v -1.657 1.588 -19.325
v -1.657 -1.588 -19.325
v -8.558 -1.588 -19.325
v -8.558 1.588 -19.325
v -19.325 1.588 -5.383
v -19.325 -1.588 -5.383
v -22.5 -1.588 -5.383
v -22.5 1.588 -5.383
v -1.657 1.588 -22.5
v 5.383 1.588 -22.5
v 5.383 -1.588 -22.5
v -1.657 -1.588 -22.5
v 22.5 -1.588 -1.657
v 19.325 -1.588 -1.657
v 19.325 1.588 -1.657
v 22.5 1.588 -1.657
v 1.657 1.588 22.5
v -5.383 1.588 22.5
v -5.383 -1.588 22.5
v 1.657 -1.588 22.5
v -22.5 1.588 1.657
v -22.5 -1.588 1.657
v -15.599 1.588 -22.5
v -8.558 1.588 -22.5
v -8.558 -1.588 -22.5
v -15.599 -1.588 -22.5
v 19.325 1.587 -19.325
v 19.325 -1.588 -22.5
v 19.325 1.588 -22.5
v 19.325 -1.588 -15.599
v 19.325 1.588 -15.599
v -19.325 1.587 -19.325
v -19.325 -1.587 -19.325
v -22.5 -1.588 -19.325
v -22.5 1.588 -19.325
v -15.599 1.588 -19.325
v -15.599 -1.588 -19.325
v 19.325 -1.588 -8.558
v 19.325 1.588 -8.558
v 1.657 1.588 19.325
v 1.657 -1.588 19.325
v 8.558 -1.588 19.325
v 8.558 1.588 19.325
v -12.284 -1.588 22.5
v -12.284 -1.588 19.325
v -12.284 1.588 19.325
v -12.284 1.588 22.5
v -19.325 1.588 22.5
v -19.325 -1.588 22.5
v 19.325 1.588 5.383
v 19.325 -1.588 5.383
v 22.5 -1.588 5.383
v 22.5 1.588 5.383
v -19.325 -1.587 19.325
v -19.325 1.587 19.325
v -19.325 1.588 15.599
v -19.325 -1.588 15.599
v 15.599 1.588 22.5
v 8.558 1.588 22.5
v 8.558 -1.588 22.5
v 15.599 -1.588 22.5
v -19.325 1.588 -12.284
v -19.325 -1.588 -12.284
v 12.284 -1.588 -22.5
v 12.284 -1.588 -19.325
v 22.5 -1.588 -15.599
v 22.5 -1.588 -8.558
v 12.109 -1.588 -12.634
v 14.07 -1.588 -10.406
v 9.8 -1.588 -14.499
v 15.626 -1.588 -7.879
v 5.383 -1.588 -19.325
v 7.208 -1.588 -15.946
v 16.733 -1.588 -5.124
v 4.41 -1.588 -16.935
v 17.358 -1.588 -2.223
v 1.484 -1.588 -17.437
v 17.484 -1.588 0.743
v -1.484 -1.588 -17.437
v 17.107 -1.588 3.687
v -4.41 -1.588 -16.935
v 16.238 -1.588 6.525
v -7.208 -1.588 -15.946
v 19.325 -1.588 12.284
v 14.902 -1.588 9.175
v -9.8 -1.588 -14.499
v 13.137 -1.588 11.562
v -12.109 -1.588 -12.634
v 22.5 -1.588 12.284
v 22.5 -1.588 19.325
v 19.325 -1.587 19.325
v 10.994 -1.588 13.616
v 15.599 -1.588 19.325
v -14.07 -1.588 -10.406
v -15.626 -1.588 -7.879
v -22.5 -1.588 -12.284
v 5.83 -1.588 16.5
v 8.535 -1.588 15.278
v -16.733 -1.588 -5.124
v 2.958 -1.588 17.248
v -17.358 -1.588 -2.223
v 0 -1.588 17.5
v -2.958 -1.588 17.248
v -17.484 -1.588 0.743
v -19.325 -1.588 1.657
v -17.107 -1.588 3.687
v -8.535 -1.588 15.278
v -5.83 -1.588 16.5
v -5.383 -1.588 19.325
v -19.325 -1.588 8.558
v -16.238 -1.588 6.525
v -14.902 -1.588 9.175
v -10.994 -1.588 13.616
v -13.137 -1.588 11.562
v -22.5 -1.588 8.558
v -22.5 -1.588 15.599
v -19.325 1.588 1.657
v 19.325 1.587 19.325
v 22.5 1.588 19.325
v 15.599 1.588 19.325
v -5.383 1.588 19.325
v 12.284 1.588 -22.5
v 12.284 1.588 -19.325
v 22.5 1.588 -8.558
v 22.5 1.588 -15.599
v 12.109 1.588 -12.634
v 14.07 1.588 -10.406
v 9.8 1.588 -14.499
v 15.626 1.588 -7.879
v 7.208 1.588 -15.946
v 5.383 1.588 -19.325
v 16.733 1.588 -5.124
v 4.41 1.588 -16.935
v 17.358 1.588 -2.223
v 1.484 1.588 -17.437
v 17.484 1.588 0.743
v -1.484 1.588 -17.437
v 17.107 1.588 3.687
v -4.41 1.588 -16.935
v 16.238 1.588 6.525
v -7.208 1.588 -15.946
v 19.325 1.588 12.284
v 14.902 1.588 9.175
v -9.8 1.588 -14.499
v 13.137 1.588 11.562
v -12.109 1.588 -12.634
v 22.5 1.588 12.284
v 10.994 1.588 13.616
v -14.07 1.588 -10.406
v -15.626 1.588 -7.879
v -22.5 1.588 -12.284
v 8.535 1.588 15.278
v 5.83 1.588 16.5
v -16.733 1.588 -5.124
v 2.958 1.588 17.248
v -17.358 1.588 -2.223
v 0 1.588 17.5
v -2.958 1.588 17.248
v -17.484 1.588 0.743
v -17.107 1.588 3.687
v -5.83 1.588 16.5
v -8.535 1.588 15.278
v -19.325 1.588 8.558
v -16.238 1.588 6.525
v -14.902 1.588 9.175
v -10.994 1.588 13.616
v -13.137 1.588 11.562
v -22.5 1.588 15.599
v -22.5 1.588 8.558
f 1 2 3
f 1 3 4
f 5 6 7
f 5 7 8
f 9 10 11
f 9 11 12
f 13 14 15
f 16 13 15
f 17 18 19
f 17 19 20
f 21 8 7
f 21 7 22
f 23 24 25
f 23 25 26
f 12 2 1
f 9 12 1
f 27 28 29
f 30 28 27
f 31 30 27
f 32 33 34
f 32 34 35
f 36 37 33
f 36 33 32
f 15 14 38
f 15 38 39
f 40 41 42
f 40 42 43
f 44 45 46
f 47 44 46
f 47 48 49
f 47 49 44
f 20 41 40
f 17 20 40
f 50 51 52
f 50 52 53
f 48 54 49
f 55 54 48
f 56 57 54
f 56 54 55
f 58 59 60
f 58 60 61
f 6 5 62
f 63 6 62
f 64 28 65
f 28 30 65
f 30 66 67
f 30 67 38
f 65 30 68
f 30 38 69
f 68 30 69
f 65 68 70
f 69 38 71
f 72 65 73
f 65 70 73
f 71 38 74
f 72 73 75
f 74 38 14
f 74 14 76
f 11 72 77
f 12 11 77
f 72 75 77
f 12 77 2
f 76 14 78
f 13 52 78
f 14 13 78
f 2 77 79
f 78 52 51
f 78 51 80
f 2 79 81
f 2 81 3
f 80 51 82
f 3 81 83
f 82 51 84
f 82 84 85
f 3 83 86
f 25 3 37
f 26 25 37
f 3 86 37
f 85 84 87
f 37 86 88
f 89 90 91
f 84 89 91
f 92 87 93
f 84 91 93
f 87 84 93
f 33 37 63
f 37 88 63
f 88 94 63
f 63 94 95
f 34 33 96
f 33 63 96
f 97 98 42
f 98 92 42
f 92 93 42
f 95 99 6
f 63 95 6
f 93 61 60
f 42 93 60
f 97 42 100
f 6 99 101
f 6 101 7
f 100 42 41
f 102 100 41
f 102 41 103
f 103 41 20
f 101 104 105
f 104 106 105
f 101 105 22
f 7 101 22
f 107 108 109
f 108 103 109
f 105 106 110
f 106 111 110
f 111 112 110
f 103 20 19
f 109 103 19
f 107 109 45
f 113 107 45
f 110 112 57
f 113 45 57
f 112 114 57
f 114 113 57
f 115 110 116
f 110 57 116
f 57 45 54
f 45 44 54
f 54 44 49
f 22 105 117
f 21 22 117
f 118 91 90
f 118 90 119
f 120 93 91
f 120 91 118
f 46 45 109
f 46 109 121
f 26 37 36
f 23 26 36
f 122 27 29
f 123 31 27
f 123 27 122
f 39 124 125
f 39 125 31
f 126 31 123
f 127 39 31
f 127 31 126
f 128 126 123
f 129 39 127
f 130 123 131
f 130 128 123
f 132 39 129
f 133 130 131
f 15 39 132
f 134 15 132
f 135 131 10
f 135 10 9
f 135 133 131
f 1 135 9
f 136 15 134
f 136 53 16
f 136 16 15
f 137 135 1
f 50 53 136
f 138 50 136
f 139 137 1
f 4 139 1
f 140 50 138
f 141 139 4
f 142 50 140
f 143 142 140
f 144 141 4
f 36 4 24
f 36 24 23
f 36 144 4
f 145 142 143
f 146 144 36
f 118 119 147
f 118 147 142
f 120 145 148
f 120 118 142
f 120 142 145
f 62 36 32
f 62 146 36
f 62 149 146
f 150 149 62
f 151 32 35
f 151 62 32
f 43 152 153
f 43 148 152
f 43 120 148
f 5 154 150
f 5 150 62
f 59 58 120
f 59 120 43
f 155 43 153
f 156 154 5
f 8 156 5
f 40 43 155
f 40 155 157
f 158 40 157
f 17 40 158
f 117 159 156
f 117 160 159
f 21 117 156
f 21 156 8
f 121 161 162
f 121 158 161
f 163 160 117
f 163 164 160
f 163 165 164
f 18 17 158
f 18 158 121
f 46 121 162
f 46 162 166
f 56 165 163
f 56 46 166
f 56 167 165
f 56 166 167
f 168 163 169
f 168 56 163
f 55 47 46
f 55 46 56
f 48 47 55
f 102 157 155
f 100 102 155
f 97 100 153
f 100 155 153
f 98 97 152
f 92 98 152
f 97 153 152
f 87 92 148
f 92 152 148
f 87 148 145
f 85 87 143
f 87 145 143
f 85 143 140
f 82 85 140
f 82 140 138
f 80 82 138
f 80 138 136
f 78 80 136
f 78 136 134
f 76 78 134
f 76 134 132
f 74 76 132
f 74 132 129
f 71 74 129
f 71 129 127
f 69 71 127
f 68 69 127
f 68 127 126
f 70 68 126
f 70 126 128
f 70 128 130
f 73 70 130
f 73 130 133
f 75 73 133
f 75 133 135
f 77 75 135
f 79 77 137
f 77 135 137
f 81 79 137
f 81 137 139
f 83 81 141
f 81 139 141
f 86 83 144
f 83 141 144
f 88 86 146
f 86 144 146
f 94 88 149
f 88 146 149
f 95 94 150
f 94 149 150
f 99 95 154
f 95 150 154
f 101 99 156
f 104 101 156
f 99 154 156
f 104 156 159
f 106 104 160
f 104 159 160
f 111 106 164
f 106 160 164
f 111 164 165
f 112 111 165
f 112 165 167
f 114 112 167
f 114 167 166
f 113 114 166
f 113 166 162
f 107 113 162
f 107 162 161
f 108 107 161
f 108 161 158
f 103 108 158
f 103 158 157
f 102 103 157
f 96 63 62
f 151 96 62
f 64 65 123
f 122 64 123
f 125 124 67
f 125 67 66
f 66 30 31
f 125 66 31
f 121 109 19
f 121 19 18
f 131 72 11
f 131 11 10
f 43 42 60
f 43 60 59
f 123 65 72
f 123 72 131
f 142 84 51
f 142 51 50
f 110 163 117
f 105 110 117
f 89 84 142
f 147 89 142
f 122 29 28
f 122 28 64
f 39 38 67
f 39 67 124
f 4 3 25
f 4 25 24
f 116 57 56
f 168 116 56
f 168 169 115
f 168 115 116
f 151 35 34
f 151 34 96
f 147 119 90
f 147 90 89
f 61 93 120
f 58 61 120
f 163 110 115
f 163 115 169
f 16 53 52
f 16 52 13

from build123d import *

# Parameters (mm, degrees)
SKETCH2_W                   = 38.65
SKETCH2_H                   = 38.65
BOSS_EXTRUDE1_DEPTH         = 1.5875
SKETCH8_W                   = 7.040833333
SKETCH8_H                   = 3.175
BOSS_EXTRUDE3_DEPTH         = 3.175
LPATTERN3_COUNT             = 3
LPATTERN3_PITCH             = 13.941666667
CIRPATTERN1_COUNT           = 4
CIRPATTERN1_COPY_1_SKETCH_W = 7.040833333
CIRPATTERN1_COPY_1_SKETCH_H = 3.175
CIRPATTERN1_COPY_1_DEPTH    = 3.175
CIRPATTERN1_COPY_2_SKETCH_W = 7.040833333
CIRPATTERN1_COPY_2_SKETCH_H = 3.175
CIRPATTERN1_COPY_2_DEPTH    = 3.175
CIRPATTERN1_COPY_3_SKETCH_W = 7.040833333
CIRPATTERN1_COPY_3_SKETCH_H = 3.175
CIRPATTERN1_COPY_3_DEPTH    = 3.175
CIRPATTERN1_COPY_4_SKETCH_W = 7.040833333
CIRPATTERN1_COPY_4_SKETCH_H = 3.175
CIRPATTERN1_COPY_4_DEPTH    = 3.175
CIRPATTERN1_COPY_5_SKETCH_W = 7.040833333
CIRPATTERN1_COPY_5_SKETCH_H = 3.175
CIRPATTERN1_COPY_5_DEPTH    = 3.175
CIRPATTERN1_COPY_6_SKETCH_W = 7.040833333
CIRPATTERN1_COPY_6_SKETCH_H = 3.175
CIRPATTERN1_COPY_6_DEPTH    = 3.175
SKETCH15_R                  = 17.5
CUT_EXTRUDE8_DEPTH          = 32.977814575


with BuildPart() as part:
    # Sketch2 → Boss-Extrude1 (new, symmetric)
    with BuildSketch(Plane(origin=(0, 0, 0), x_dir=(1, 0, 0), z_dir=(0, 1, 0))):
        Rectangle(SKETCH2_W, SKETCH2_H)
    extrude(amount=BOSS_EXTRUDE1_DEPTH, both=True)

    # Sketch8 → Boss-Extrude3 (add)
    with BuildSketch(Plane.ZY.offset(19.325)):
        with Locations((-15.804583334, 0)):
            Rectangle(SKETCH8_W, SKETCH8_H)
    boss_extrude3 = extrude(amount=BOSS_EXTRUDE3_DEPTH)

    # LPattern3: Boss-Extrude3 ×3
    with Locations(*[(0, 0, i * LPATTERN3_PITCH) for i in range(1, LPATTERN3_COUNT)]):
        add(boss_extrude3)

    # CirPattern1: Boss-Extrude3 ×4 about axis
    cirpattern1_axis = Axis((0, 0, 0), (0, 1, 0))
    for i in range(1, CIRPATTERN1_COUNT):
        add(boss_extrude3.rotate(cirpattern1_axis, i * 360 / CIRPATTERN1_COUNT))

    # CirPattern1 copy 1 sketch → CirPattern1 copy 1 (add)
    with BuildSketch(Plane(origin=(13.941666667, 0, 19.325), x_dir=(1, 0, 0), z_dir=(0, 0, 1))):
        with Locations((-15.804583334, 0)):
            Rectangle(CIRPATTERN1_COPY_1_SKETCH_W, CIRPATTERN1_COPY_1_SKETCH_H)
    extrude(amount=CIRPATTERN1_COPY_1_DEPTH)

    # CirPattern1 copy 2 sketch → CirPattern1 copy 2 (add)
    with BuildSketch(Plane(origin=(19.325, 0, -13.941666667), x_dir=(0, 0, -1), z_dir=(1, 0, 0))):
        with Locations((-15.804583334, 0)):
            Rectangle(CIRPATTERN1_COPY_2_SKETCH_W, CIRPATTERN1_COPY_2_SKETCH_H)
    extrude(amount=CIRPATTERN1_COPY_2_DEPTH)

    # CirPattern1 copy 3 sketch → CirPattern1 copy 3 (add)
    with BuildSketch(Plane(origin=(-13.941666667, 0, -19.325), x_dir=(-1, 0, 0), z_dir=(0, 0, -1))):
        with Locations((-15.804583334, 0)):
            Rectangle(CIRPATTERN1_COPY_3_SKETCH_W, CIRPATTERN1_COPY_3_SKETCH_H)
    extrude(amount=CIRPATTERN1_COPY_3_DEPTH)

    # CirPattern1 copy 4 sketch → CirPattern1 copy 4 (add)
    with BuildSketch(Plane(origin=(27.883333333, 0, 19.325), x_dir=(1, 0, 0), z_dir=(0, 0, 1))):
        with Locations((-15.804583334, 0)):
            Rectangle(CIRPATTERN1_COPY_4_SKETCH_W, CIRPATTERN1_COPY_4_SKETCH_H)
    extrude(amount=CIRPATTERN1_COPY_4_DEPTH)

    # CirPattern1 copy 5 sketch → CirPattern1 copy 5 (add)
    with BuildSketch(Plane(origin=(19.325, 0, -27.883333333), x_dir=(0, 0, -1), z_dir=(1, 0, 0))):
        with Locations((-15.804583334, 0)):
            Rectangle(CIRPATTERN1_COPY_5_SKETCH_W, CIRPATTERN1_COPY_5_SKETCH_H)
    extrude(amount=CIRPATTERN1_COPY_5_DEPTH)

    # CirPattern1 copy 6 sketch → CirPattern1 copy 6 (add)
    with BuildSketch(Plane(origin=(-27.883333333, 0, -19.325), x_dir=(-1, 0, 0), z_dir=(0, 0, -1))):
        with Locations((-15.804583334, 0)):
            Rectangle(CIRPATTERN1_COPY_6_SKETCH_W, CIRPATTERN1_COPY_6_SKETCH_H)
    extrude(amount=CIRPATTERN1_COPY_6_DEPTH)

    # Sketch15 → Cut-Extrude8 (cut, through all)
    with BuildSketch(Plane(origin=(0, 1.5875, 0), x_dir=(1, 0, 0), z_dir=(0, 1, 0))):
        Circle(SKETCH15_R)
    extrude(amount=-CUT_EXTRUDE8_DEPTH, mode=Mode.SUBTRACT)


solid = part.part
